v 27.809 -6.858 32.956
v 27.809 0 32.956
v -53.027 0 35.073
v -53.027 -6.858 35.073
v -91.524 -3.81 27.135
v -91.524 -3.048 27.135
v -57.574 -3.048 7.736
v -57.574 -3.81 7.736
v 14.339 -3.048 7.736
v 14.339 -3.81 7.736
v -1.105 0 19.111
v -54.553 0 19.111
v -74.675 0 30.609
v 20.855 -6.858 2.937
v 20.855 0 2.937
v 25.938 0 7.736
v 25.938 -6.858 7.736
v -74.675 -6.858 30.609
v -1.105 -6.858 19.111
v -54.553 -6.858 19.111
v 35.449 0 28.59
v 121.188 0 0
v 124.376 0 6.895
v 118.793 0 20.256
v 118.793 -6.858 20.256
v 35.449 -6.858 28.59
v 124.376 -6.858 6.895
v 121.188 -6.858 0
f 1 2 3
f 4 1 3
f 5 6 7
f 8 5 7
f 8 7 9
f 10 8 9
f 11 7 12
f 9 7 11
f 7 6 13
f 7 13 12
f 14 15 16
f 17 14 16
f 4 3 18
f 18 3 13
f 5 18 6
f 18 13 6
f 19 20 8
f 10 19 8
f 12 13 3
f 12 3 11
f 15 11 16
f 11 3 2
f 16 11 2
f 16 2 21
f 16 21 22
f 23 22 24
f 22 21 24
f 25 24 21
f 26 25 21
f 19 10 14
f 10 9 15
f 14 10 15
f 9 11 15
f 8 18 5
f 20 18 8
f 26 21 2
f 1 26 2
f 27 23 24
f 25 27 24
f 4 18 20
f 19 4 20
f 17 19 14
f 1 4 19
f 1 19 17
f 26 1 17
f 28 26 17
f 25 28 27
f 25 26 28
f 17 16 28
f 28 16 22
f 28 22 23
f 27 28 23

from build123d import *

# Parameters (mm, degrees)
F1_DEPTH = 6.858
F4_SIZE2 = 11.3752908615
F4_SIZE  = 3.048
F5_SIZE2 = 3.048
F5_SIZE  = 11.3752908615


with BuildPart() as f1:
    # F0 (on Front) → F1 (new body)
    with BuildSketch(Plane.XZ):
        Polygon((25.9381346405, 7.736035157), (14.33934737, 7.736035157), (20.8550654352, 2.9368868563), align=None)
        Polygon((-53.0272046242, 35.0727677199), (-91.5240803441, 27.1352675399), (-57.573735714, 7.736035157), (14.33934737, 7.736035157), (25.9381346405, 7.736035157), (121.1881346405, 0), (124.3759196559, 6.8946417749), (118.7927769162, 20.2559313961), (35.4490326759, 28.5903061262), (27.808678696, 32.9560056193), align=None)
    extrude(amount=F1_DEPTH)

    # F4
    f4_edges = [f1.edges().sort_by_distance(p)[0] for p in [
        (-74.548908, -6.858, 17.435651),
        (-21.617194, -6.858, 7.736035),
    ]]
    chamfer(f4_edges, length=F4_SIZE, length2=F4_SIZE2)

    # F5
    f5_edges = [f1.edges().sort_by_distance(p)[0] for p in [
        (-74.548908, 0, 17.435651),
        (-21.617194, 0, 7.736035),
    ]]
    f5_side = f1.faces().sort_by_distance((17.333868, 0, 18.236696))[0]
    chamfer(f5_edges, length=F5_SIZE, length2=F5_SIZE2, reference=f5_side)


solid = f1.part
